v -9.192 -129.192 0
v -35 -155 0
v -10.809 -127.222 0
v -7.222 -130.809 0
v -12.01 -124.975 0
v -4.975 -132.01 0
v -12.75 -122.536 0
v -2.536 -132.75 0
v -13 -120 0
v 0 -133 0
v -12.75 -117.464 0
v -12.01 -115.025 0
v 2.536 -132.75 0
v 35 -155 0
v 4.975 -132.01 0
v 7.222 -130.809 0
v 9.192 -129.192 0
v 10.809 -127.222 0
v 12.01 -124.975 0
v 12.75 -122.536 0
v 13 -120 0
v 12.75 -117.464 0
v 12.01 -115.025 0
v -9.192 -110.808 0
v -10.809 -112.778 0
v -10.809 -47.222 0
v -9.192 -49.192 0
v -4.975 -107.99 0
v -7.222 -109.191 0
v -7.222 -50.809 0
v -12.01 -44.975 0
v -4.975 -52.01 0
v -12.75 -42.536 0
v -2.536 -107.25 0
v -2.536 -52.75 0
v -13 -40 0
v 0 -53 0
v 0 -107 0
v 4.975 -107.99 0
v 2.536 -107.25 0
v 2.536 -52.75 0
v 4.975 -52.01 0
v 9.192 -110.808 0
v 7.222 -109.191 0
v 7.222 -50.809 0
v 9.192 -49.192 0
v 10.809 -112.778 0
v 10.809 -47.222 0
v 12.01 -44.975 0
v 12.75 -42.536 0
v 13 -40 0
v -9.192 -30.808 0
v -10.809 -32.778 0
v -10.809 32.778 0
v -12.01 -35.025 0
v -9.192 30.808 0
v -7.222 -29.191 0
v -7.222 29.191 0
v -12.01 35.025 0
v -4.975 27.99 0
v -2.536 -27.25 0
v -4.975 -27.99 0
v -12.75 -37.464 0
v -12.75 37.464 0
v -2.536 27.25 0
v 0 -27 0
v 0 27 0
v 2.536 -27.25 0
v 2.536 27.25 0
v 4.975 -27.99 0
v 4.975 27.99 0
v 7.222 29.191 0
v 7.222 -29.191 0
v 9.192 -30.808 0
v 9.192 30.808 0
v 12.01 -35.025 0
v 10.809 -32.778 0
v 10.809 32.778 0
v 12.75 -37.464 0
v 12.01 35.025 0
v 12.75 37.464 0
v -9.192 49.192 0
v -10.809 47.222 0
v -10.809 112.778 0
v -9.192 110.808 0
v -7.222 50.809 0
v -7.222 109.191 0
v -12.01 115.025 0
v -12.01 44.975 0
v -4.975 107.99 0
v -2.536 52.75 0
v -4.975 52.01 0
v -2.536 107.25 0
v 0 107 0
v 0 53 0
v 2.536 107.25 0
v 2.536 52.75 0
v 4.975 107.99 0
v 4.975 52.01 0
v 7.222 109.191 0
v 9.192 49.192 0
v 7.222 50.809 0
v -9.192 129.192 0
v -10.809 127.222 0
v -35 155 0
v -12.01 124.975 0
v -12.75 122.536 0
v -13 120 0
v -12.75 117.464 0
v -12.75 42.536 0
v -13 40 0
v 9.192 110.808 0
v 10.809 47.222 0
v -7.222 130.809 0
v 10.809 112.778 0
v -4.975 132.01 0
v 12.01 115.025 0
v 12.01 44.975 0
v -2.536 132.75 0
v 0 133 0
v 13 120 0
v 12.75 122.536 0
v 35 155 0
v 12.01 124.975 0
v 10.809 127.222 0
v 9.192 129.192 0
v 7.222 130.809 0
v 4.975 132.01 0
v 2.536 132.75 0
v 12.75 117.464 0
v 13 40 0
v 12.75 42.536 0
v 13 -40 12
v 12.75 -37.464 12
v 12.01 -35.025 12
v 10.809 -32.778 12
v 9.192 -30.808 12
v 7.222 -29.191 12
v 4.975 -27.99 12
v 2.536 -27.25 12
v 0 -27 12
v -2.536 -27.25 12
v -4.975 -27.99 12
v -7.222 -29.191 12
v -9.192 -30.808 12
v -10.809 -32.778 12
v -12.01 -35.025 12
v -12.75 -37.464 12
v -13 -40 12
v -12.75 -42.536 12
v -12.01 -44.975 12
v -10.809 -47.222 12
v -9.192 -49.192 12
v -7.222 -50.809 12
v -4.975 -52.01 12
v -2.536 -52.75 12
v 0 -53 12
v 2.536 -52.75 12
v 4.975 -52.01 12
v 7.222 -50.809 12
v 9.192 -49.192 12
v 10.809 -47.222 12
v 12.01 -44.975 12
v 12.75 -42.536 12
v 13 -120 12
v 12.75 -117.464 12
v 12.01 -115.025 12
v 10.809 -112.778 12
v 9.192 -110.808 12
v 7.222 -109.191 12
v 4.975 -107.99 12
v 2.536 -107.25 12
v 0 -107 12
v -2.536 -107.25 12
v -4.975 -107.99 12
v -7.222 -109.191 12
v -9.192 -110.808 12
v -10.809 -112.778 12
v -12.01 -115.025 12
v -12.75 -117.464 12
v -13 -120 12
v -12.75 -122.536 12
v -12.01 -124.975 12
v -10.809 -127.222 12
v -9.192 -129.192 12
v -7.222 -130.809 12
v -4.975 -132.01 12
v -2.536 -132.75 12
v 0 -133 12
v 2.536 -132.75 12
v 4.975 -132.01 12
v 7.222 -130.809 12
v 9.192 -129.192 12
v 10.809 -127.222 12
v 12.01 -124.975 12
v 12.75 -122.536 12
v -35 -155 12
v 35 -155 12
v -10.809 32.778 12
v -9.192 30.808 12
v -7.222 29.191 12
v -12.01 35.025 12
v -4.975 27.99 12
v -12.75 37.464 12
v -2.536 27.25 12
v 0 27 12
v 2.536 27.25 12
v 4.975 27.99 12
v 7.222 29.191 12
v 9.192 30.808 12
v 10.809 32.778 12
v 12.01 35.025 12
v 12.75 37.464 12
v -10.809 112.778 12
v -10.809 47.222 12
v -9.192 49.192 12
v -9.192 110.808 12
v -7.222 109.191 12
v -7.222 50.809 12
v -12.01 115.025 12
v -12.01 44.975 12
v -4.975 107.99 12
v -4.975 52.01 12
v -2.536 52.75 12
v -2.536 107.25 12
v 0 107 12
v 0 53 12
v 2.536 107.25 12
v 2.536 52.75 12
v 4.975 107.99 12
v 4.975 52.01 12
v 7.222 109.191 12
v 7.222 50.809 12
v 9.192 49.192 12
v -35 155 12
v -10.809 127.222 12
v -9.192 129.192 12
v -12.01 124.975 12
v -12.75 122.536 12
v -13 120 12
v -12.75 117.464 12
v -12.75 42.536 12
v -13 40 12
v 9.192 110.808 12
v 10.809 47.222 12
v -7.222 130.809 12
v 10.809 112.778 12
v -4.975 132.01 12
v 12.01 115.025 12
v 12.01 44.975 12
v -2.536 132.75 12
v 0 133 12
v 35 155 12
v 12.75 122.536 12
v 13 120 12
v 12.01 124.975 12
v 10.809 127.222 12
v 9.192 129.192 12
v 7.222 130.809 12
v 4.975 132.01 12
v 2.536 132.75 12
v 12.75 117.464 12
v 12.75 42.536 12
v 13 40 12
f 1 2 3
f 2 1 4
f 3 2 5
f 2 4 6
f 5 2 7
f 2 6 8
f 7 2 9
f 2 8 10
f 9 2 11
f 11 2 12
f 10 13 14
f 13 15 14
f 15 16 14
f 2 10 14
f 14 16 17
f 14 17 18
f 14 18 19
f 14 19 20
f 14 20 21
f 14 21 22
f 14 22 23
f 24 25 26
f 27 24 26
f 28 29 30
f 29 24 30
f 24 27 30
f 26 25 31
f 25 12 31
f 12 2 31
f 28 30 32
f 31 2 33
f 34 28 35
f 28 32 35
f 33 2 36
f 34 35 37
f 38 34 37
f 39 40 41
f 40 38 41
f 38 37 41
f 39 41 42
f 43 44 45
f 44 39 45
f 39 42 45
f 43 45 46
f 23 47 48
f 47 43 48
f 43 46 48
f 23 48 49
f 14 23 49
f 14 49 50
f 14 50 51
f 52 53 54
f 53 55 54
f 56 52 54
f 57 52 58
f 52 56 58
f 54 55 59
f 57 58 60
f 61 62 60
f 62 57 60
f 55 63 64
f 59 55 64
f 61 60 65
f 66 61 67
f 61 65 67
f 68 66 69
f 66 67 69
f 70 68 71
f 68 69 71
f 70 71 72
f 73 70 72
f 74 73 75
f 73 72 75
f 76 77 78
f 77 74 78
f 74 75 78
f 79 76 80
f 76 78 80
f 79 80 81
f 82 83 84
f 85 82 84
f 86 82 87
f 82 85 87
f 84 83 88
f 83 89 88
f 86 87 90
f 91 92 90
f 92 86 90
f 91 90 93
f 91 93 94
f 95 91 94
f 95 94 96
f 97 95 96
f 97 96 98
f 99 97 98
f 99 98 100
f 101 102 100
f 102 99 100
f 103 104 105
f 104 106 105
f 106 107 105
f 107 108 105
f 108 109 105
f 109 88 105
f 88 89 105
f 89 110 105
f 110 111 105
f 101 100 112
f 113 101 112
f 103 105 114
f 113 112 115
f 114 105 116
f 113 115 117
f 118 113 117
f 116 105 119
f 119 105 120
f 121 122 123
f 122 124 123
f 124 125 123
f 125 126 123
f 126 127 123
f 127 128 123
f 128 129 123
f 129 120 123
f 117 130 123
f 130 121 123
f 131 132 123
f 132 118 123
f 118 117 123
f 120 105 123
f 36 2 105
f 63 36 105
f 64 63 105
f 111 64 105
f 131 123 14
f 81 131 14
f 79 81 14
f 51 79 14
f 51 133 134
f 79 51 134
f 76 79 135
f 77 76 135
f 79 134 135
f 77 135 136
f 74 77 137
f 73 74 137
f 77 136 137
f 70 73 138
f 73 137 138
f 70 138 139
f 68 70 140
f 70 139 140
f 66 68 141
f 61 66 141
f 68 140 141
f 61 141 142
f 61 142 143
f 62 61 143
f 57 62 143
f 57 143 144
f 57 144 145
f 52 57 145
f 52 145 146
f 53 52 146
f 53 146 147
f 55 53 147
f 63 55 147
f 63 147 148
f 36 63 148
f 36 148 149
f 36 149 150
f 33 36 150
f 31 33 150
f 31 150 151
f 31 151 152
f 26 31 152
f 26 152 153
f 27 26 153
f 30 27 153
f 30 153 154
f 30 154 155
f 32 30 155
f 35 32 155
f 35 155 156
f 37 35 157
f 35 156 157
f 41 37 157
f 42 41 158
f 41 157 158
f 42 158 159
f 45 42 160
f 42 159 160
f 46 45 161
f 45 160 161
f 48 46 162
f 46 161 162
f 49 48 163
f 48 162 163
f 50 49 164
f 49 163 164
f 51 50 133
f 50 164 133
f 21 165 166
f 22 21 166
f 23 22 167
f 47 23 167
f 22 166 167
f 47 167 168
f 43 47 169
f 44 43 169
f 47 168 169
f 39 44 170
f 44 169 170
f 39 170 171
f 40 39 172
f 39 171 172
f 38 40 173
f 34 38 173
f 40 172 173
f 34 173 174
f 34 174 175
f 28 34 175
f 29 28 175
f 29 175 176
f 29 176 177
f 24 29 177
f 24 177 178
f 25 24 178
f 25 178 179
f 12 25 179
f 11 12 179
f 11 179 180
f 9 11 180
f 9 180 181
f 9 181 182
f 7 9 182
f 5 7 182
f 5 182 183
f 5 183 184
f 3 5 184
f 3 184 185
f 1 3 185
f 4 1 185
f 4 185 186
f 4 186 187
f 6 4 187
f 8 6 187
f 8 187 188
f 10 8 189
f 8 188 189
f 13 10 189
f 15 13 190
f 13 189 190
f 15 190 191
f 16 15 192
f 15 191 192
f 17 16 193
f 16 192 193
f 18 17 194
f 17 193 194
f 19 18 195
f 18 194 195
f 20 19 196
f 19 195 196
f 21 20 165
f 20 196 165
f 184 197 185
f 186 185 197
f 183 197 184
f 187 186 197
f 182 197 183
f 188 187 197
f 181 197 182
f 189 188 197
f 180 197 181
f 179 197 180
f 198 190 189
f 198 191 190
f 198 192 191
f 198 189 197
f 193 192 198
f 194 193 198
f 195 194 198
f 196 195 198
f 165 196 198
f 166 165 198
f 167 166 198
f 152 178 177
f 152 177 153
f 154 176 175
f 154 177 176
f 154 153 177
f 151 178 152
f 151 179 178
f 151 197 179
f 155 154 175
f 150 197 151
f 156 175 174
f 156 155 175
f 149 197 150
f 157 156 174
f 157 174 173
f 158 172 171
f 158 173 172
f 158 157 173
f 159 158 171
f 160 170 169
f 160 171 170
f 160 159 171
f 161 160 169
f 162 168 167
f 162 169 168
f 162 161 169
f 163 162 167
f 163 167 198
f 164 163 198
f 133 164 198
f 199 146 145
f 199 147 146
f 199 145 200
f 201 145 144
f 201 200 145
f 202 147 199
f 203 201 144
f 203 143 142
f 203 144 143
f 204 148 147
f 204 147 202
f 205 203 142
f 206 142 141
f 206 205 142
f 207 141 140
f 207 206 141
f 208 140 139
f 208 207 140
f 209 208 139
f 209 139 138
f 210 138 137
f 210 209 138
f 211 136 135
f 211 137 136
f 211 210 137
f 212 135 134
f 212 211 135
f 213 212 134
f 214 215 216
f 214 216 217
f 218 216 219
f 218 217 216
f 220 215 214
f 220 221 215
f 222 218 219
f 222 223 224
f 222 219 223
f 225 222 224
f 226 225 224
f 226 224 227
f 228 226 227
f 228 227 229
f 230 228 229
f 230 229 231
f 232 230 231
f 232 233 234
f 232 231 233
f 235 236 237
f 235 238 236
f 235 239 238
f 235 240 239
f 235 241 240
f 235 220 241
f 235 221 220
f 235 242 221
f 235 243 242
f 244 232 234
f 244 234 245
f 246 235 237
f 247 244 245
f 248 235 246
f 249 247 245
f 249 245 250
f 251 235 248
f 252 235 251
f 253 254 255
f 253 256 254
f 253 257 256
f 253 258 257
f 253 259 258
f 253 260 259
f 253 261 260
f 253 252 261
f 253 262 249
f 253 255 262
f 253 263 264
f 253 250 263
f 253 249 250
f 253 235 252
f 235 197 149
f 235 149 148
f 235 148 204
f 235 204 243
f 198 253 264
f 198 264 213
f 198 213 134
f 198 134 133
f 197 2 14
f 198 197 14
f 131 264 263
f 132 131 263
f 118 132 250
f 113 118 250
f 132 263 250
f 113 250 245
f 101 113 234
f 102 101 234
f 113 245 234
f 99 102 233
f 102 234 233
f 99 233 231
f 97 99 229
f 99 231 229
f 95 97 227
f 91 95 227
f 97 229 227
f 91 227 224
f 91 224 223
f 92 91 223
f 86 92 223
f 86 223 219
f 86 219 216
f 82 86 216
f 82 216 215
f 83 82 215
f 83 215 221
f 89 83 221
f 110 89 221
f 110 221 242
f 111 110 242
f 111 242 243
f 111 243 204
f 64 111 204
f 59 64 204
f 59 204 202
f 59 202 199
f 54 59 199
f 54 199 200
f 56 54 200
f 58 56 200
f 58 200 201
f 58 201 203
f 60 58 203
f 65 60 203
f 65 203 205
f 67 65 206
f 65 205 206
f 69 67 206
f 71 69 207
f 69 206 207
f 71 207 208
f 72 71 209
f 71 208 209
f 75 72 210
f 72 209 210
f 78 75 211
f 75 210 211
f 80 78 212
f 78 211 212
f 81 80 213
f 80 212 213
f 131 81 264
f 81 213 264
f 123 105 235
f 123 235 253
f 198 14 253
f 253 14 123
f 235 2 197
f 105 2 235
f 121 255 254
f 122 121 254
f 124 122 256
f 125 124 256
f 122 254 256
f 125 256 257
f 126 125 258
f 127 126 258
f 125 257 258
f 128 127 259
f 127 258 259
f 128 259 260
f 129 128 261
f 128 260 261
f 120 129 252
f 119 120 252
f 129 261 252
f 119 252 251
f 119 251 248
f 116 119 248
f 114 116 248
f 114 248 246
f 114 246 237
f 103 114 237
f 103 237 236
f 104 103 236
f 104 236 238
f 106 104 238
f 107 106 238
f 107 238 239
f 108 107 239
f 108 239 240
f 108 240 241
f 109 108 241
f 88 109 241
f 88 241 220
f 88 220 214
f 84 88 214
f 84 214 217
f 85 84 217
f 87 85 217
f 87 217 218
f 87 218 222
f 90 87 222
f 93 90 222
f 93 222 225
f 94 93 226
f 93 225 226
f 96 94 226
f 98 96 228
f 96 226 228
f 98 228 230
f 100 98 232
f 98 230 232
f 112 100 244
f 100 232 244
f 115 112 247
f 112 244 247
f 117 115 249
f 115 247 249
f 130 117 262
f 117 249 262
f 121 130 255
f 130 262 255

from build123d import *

# Parameters (mm, degrees)
SKETCH_1_W             = 70
SKETCH_1_H             = 310
EXTRUDE_1_DEPTH        = 12
SKETCH_2_R             = 13
CUT_EXTRUDE_1_DEPTH    = 160.354949719
PATTERN_LINEAR_1_COUNT = 4
PATTERN_LINEAR_1_PITCH = 80


with BuildPart() as part:
    # 草图1 → 凸台-拉伸1 (new body)
    with BuildSketch(Plane.XY):
        Rectangle(SKETCH_1_W, SKETCH_1_H)
    extrude(amount=EXTRUDE_1_DEPTH)

    # 草图2 → 切除-拉伸1 (cut, through all)
    with BuildSketch(Plane.XY.offset(12)):
        with Locations((0, 120)):
            Circle(SKETCH_2_R)
    cut_extrude_1 = extrude(amount=-CUT_EXTRUDE_1_DEPTH, mode=Mode.SUBTRACT)

    # 阵列(线性)1: 切除-拉伸1 ×4
    with Locations(*[(0, -i * PATTERN_LINEAR_1_PITCH, 0) for i in range(1, PATTERN_LINEAR_1_COUNT)]):
        add(cut_extrude_1, mode=Mode.SUBTRACT)


solid = part.part
